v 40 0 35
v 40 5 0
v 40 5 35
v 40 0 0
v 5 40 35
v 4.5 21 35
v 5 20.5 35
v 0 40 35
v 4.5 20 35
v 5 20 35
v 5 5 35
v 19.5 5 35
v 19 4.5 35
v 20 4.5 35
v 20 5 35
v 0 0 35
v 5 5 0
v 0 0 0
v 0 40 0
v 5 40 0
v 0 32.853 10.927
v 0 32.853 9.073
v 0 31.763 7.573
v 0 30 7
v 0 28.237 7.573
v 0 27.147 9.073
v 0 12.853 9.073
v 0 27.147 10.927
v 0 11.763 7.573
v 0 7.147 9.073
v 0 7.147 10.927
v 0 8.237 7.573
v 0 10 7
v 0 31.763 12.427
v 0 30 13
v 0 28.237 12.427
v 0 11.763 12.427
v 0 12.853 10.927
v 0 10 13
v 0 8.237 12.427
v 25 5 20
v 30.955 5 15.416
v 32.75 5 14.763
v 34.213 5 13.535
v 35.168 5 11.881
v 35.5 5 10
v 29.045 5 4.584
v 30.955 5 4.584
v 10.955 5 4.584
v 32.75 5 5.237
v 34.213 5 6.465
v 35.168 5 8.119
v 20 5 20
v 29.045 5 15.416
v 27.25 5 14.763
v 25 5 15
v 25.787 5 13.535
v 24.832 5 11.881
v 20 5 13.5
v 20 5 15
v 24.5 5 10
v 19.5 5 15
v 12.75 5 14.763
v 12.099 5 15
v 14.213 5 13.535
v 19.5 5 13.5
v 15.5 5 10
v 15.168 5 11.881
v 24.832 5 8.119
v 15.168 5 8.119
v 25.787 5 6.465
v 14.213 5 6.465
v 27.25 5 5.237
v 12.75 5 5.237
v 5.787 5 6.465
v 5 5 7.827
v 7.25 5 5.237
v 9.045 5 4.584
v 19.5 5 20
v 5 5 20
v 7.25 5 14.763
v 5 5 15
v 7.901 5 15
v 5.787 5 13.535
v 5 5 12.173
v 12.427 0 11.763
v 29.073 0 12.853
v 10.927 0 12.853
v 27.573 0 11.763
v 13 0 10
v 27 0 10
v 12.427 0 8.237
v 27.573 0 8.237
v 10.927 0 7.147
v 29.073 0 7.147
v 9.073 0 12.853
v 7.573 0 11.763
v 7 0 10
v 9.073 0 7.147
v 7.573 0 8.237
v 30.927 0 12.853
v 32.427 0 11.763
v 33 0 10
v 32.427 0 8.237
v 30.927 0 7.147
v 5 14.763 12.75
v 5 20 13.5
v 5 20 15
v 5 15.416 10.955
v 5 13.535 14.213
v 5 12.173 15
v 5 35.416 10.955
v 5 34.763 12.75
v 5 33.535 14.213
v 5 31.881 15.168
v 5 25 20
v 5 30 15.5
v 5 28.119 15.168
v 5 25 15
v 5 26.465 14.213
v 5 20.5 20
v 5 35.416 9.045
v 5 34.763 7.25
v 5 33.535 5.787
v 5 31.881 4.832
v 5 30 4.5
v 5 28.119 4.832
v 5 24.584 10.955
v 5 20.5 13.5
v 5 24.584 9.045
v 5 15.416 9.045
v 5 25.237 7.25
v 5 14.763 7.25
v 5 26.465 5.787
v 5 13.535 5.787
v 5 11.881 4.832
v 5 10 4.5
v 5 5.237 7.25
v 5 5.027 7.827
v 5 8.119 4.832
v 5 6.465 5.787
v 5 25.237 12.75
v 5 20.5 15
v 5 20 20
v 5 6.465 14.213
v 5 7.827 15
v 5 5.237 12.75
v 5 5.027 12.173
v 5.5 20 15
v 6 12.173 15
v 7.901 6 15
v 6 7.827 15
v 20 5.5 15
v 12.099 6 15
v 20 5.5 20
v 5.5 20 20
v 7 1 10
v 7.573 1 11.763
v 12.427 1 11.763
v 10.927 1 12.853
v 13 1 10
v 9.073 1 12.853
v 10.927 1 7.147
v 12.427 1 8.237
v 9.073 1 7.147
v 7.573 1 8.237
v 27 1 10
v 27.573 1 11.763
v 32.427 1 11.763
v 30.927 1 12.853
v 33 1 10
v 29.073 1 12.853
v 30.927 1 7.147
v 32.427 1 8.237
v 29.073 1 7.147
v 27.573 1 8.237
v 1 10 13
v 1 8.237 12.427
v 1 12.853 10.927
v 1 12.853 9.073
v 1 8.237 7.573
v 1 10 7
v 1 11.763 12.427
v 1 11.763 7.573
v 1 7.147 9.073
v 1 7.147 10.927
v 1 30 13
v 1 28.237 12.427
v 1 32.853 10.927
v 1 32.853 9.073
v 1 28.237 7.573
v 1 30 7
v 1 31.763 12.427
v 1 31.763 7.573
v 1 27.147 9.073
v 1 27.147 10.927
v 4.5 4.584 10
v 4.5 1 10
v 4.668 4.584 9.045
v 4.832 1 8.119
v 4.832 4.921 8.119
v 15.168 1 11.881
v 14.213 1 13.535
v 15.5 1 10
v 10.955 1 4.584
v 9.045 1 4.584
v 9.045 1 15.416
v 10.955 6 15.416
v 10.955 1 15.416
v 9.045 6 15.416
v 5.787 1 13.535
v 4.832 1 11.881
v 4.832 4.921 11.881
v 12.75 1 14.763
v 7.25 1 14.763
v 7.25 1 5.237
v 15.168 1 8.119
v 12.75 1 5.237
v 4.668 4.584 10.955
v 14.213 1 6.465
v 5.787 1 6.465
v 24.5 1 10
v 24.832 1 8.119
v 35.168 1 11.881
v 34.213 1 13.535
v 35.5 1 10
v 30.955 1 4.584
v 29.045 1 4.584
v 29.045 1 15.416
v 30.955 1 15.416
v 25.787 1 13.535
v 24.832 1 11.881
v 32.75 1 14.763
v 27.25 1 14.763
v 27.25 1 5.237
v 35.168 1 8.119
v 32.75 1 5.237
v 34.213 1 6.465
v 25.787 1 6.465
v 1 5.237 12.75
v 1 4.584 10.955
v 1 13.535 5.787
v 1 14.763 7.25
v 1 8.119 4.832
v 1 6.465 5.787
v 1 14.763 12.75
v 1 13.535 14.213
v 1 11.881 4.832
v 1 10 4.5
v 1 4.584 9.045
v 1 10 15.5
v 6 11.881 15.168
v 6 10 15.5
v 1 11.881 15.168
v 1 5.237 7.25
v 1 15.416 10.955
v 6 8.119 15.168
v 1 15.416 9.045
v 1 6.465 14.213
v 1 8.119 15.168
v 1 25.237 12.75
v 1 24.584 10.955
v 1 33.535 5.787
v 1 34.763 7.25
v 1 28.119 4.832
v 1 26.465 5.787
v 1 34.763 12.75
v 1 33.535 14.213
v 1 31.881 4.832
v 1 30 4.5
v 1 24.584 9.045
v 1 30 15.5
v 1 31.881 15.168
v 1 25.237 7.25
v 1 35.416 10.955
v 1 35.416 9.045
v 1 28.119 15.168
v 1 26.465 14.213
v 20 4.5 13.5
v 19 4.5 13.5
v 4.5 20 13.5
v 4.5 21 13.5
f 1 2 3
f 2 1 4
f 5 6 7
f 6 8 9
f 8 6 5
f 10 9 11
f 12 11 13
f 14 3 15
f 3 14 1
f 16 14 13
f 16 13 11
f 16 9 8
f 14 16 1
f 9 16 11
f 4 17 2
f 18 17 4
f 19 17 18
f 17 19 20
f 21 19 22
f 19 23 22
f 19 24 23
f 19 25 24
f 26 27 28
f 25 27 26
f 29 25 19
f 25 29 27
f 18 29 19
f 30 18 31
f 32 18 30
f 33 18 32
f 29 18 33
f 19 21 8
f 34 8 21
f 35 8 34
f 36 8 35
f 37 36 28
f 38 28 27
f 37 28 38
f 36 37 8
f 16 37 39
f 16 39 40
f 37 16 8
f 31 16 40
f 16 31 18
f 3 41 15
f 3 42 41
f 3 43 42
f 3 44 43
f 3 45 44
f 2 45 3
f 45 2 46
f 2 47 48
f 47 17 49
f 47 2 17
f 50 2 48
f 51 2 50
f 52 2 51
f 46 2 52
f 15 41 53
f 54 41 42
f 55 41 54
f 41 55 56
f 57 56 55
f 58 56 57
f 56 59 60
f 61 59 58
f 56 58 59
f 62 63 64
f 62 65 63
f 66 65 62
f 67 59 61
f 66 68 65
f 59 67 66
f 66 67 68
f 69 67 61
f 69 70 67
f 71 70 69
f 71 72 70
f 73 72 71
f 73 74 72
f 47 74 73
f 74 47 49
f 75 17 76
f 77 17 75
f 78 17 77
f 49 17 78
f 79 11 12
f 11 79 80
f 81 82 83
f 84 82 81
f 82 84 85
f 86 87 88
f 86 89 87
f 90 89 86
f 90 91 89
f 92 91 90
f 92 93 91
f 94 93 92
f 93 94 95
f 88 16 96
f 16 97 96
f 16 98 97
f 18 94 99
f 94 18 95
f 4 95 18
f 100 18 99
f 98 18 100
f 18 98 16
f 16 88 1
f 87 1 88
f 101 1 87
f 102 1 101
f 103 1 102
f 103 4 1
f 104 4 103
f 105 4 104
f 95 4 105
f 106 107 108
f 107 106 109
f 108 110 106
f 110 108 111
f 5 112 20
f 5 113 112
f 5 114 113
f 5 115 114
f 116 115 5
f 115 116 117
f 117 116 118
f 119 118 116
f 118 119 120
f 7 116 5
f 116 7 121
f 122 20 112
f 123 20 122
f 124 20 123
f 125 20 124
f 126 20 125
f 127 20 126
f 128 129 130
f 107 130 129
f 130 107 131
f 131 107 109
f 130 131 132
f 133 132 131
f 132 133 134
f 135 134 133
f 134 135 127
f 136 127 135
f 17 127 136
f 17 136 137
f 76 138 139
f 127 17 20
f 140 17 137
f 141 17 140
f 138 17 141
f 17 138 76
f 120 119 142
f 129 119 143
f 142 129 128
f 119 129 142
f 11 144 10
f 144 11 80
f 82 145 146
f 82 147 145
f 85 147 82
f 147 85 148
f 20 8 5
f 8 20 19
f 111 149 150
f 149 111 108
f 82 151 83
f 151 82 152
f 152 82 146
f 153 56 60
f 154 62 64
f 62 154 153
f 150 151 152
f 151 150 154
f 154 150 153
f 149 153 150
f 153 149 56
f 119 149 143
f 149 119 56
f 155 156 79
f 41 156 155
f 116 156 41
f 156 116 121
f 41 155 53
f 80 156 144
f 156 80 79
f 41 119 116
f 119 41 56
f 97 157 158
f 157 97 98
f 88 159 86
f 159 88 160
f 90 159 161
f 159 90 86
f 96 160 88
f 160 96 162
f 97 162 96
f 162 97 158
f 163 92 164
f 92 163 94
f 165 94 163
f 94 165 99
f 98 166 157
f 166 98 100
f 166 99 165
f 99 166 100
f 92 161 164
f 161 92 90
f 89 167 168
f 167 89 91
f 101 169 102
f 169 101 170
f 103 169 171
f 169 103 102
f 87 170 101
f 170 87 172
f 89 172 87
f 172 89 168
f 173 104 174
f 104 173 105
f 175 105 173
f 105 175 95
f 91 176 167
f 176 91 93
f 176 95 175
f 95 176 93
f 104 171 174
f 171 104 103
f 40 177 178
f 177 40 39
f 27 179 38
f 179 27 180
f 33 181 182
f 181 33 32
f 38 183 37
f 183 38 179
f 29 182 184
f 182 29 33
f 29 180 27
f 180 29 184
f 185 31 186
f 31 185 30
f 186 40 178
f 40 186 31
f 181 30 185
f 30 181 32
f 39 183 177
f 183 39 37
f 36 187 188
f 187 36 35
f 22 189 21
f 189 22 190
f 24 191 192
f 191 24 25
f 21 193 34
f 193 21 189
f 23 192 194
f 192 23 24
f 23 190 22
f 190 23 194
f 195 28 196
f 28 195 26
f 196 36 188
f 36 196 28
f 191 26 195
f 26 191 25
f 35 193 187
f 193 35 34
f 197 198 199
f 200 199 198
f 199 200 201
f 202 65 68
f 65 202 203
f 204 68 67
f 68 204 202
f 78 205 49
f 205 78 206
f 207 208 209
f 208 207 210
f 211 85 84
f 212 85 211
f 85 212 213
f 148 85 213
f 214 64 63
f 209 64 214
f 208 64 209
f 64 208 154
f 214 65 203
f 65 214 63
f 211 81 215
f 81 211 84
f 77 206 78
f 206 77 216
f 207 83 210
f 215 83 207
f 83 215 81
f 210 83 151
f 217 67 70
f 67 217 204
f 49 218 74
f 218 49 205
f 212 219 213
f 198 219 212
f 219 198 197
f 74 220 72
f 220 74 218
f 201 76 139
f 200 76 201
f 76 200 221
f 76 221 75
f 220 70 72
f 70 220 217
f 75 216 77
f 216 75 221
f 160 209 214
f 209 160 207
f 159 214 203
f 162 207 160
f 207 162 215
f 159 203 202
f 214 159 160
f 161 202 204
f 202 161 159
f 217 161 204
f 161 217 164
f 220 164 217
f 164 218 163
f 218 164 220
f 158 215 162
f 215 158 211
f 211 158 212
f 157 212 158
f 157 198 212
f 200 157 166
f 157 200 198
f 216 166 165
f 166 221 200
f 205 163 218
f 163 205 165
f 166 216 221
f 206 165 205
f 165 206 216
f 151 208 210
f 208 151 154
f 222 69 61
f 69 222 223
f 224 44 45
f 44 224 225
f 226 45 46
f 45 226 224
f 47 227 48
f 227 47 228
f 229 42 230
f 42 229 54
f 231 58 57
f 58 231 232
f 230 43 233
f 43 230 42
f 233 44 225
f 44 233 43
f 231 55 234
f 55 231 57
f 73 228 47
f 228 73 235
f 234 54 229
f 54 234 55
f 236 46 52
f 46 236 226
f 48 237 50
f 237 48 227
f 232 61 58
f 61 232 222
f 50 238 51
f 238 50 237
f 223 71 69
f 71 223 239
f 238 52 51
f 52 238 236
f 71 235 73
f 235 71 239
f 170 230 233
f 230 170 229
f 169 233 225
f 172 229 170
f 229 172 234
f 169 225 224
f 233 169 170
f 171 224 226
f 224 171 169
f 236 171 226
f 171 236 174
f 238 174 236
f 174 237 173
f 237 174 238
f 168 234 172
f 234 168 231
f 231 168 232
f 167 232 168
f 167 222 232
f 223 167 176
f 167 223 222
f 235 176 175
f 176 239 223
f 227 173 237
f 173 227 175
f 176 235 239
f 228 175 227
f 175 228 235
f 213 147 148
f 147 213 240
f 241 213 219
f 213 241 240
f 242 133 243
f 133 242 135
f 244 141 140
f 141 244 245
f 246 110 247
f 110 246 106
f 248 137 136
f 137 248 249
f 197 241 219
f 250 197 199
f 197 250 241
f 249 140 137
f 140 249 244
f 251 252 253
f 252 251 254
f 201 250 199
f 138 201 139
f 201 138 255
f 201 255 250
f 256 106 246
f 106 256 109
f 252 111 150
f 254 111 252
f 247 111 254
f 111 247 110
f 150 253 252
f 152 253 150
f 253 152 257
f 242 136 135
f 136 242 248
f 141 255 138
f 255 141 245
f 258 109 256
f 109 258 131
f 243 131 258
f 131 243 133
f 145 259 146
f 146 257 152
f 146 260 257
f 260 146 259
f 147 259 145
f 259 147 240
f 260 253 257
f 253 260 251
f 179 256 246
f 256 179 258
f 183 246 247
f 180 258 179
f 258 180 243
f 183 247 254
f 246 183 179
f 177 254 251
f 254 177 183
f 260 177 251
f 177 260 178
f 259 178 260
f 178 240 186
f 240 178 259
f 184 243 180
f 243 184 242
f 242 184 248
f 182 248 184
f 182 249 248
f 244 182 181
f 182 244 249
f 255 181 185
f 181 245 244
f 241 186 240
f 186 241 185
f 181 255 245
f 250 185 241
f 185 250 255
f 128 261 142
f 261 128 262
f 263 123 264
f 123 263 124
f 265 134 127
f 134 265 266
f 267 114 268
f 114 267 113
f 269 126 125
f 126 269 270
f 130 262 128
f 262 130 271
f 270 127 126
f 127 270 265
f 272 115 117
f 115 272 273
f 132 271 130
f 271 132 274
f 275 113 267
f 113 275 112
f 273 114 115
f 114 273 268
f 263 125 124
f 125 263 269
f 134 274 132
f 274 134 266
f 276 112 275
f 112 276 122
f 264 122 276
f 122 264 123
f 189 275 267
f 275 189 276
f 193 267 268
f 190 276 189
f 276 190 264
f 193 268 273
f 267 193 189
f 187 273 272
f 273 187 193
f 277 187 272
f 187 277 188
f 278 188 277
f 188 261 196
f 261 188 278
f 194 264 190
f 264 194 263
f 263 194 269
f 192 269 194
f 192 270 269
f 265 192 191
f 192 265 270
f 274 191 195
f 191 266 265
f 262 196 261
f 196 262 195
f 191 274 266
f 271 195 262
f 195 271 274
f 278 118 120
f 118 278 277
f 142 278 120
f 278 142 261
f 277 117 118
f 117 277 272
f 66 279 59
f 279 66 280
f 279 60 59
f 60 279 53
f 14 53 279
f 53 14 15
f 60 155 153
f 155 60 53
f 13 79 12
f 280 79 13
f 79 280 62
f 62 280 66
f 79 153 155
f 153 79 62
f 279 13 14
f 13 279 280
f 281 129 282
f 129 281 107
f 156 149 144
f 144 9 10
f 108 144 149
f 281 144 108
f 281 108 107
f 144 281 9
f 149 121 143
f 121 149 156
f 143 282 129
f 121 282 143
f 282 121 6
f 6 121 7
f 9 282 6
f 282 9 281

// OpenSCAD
// Parameters
L1 = 40; //[20:80:1]
L2 = 40; //[20:80:1]
H = 35; //[18:70:1]
t = 5; //[3:10:1]
hole_d = 6; //[3:12:0.5]
hole_edge_offset = 10; //[6:20:1]
hole_spacing = 20; //[10:40:1]
overlap = 1; //[0.5:2:0.5]
gusset_thickness = 5; //[3:10:1]
gusset_leg = 22; //[12:40:1]
csk_d = 11; //[8:18:0.5]
csk_depth = 3; //[1:6:0.5]
edge_chamfer = 1; //[0.5:3:0.5]

// Base Shapes
module bracket_body_L_legA() {
  translate([L1/2, t/2, H/2])
    cube([L1, t, H], center=true);
}

module bracket_body_L_legB() {
  translate([t/2, L2/2, H/2])
    cube([t, L2, H], center=true);
}

module internal_corner_gusset_prism() {
  translate([0, 0, H/2])
    linear_extrude(height=gusset_thickness, center=true)
      polygon(points=[
        [t - overlap, t - overlap],
        [t - overlap + gusset_leg, t - overlap],
        [t - overlap, t - overlap + gusset_leg]
      ]);
}

module mounting_hole_A1() {
  translate([hole_edge_offset, t/2, hole_edge_offset])
    rotate([90, 0, 0])
      cylinder(r=hole_d/2, h=t + 2*overlap, center=true);
}

module mounting_hole_A2() {
  translate([hole_edge_offset + hole_spacing, t/2, hole_edge_offset])
    rotate([90, 0, 0])
      cylinder(r=hole_d/2, h=t + 2*overlap, center=true);
}

module mounting_hole_B1() {
  translate([t/2, hole_edge_offset, hole_edge_offset])
    rotate([0, 90, 0])
      cylinder(r=hole_d/2, h=t + 2*overlap, center=true);
}

module mounting_hole_B2() {
  translate([t/2, hole_edge_offset + hole_spacing, hole_edge_offset])
    rotate([0, 90, 0])
      cylinder(r=hole_d/2, h=t + 2*overlap, center=true);
}

module counterbore_A1() {
  translate([hole_edge_offset, t - csk_depth/2, hole_edge_offset])
    rotate([90, 0, 0])
      cylinder(r=csk_d/2, h=csk_depth + 2*overlap, center=true);
}

module counterbore_A2() {
  translate([hole_edge_offset + hole_spacing, t - csk_depth/2, hole_edge_offset])
    rotate([90, 0, 0])
      cylinder(r=csk_d/2, h=csk_depth + 2*overlap, center=true);
}

module counterbore_B1() {
  translate([t - csk_depth/2, hole_edge_offset, hole_edge_offset])
    rotate([0, 90, 0])
      cylinder(r=csk_d/2, h=csk_depth + 2*overlap, center=true);
}

module counterbore_B2() {
  translate([t - csk_depth/2, hole_edge_offset + hole_spacing, hole_edge_offset])
    rotate([0, 90, 0])
      cylinder(r=csk_d/2, h=csk_depth + 2*overlap, center=true);
}

module edge_chamfer_wedge_legA_top() {
  translate([L1/2, t - edge_chamfer/2, H - edge_chamfer/2])
    rotate([0, 0, 90])
      linear_extrude(height=L1 + 2*overlap, center=true)
        polygon(points=[
          [0, 0],
          [edge_chamfer, 0],
          [0, edge_chamfer]
        ]);
}

module edge_chamfer_wedge_legB_top() {
  translate([t - edge_chamfer/2, L2/2, H - edge_chamfer/2])
    linear_extrude(height=L2 + 2*overlap, center=true)
      polygon(points=[
        [0, 0],
        [edge_chamfer, 0],
        [0, edge_chamfer]
      ]);
}

// Operations
module bracket_body_L() {
  union() {
    bracket_body_L_legA();
    bracket_body_L_legB();
  }
}

module internal_corner_gusset() {
  union() {
    internal_corner_gusset_prism();
    bracket_body_L();
  }
}

module mounting_holes_leg_A() {
  union() {
    mounting_hole_A1();
    mounting_hole_A2();
  }
}

module mounting_holes_leg_B() {
  union() {
    mounting_hole_B1();
    mounting_hole_B2();
  }
}

module countersinks_counterbores() {
  union() {
    counterbore_A1();
    counterbore_A2();
    counterbore_B1();
    counterbore_B2();
  }
}

module edge_fillets_chamfers() {
  union() {
    edge_chamfer_wedge_legA_top();
    edge_chamfer_wedge_legB_top();
  }
}

module bracket_solid_with_gusset() {
  union() {
    bracket_body_L();
    internal_corner_gusset_prism();
  }
}

module bracket_minus_holes() {
  difference() {
    bracket_solid_with_gusset();
    mounting_hole_A1();
    mounting_hole_A2();
    mounting_hole_B1();
    mounting_hole_B2();
  }
}

module bracket_minus_holes_and_counterbores() {
  difference() {
    bracket_minus_holes();
    counterbore_A1();
    counterbore_A2();
    counterbore_B1();
    counterbore_B2();
  }
}

module bracket_minus_holes_counterbores_and_chamfers() {
  difference() {
    bracket_minus_holes_and_counterbores();
    edge_chamfer_wedge_legA_top();
    edge_chamfer_wedge_legB_top();
  }
}

// Final Output
bracket_minus_holes_counterbores_and_chamfers();
